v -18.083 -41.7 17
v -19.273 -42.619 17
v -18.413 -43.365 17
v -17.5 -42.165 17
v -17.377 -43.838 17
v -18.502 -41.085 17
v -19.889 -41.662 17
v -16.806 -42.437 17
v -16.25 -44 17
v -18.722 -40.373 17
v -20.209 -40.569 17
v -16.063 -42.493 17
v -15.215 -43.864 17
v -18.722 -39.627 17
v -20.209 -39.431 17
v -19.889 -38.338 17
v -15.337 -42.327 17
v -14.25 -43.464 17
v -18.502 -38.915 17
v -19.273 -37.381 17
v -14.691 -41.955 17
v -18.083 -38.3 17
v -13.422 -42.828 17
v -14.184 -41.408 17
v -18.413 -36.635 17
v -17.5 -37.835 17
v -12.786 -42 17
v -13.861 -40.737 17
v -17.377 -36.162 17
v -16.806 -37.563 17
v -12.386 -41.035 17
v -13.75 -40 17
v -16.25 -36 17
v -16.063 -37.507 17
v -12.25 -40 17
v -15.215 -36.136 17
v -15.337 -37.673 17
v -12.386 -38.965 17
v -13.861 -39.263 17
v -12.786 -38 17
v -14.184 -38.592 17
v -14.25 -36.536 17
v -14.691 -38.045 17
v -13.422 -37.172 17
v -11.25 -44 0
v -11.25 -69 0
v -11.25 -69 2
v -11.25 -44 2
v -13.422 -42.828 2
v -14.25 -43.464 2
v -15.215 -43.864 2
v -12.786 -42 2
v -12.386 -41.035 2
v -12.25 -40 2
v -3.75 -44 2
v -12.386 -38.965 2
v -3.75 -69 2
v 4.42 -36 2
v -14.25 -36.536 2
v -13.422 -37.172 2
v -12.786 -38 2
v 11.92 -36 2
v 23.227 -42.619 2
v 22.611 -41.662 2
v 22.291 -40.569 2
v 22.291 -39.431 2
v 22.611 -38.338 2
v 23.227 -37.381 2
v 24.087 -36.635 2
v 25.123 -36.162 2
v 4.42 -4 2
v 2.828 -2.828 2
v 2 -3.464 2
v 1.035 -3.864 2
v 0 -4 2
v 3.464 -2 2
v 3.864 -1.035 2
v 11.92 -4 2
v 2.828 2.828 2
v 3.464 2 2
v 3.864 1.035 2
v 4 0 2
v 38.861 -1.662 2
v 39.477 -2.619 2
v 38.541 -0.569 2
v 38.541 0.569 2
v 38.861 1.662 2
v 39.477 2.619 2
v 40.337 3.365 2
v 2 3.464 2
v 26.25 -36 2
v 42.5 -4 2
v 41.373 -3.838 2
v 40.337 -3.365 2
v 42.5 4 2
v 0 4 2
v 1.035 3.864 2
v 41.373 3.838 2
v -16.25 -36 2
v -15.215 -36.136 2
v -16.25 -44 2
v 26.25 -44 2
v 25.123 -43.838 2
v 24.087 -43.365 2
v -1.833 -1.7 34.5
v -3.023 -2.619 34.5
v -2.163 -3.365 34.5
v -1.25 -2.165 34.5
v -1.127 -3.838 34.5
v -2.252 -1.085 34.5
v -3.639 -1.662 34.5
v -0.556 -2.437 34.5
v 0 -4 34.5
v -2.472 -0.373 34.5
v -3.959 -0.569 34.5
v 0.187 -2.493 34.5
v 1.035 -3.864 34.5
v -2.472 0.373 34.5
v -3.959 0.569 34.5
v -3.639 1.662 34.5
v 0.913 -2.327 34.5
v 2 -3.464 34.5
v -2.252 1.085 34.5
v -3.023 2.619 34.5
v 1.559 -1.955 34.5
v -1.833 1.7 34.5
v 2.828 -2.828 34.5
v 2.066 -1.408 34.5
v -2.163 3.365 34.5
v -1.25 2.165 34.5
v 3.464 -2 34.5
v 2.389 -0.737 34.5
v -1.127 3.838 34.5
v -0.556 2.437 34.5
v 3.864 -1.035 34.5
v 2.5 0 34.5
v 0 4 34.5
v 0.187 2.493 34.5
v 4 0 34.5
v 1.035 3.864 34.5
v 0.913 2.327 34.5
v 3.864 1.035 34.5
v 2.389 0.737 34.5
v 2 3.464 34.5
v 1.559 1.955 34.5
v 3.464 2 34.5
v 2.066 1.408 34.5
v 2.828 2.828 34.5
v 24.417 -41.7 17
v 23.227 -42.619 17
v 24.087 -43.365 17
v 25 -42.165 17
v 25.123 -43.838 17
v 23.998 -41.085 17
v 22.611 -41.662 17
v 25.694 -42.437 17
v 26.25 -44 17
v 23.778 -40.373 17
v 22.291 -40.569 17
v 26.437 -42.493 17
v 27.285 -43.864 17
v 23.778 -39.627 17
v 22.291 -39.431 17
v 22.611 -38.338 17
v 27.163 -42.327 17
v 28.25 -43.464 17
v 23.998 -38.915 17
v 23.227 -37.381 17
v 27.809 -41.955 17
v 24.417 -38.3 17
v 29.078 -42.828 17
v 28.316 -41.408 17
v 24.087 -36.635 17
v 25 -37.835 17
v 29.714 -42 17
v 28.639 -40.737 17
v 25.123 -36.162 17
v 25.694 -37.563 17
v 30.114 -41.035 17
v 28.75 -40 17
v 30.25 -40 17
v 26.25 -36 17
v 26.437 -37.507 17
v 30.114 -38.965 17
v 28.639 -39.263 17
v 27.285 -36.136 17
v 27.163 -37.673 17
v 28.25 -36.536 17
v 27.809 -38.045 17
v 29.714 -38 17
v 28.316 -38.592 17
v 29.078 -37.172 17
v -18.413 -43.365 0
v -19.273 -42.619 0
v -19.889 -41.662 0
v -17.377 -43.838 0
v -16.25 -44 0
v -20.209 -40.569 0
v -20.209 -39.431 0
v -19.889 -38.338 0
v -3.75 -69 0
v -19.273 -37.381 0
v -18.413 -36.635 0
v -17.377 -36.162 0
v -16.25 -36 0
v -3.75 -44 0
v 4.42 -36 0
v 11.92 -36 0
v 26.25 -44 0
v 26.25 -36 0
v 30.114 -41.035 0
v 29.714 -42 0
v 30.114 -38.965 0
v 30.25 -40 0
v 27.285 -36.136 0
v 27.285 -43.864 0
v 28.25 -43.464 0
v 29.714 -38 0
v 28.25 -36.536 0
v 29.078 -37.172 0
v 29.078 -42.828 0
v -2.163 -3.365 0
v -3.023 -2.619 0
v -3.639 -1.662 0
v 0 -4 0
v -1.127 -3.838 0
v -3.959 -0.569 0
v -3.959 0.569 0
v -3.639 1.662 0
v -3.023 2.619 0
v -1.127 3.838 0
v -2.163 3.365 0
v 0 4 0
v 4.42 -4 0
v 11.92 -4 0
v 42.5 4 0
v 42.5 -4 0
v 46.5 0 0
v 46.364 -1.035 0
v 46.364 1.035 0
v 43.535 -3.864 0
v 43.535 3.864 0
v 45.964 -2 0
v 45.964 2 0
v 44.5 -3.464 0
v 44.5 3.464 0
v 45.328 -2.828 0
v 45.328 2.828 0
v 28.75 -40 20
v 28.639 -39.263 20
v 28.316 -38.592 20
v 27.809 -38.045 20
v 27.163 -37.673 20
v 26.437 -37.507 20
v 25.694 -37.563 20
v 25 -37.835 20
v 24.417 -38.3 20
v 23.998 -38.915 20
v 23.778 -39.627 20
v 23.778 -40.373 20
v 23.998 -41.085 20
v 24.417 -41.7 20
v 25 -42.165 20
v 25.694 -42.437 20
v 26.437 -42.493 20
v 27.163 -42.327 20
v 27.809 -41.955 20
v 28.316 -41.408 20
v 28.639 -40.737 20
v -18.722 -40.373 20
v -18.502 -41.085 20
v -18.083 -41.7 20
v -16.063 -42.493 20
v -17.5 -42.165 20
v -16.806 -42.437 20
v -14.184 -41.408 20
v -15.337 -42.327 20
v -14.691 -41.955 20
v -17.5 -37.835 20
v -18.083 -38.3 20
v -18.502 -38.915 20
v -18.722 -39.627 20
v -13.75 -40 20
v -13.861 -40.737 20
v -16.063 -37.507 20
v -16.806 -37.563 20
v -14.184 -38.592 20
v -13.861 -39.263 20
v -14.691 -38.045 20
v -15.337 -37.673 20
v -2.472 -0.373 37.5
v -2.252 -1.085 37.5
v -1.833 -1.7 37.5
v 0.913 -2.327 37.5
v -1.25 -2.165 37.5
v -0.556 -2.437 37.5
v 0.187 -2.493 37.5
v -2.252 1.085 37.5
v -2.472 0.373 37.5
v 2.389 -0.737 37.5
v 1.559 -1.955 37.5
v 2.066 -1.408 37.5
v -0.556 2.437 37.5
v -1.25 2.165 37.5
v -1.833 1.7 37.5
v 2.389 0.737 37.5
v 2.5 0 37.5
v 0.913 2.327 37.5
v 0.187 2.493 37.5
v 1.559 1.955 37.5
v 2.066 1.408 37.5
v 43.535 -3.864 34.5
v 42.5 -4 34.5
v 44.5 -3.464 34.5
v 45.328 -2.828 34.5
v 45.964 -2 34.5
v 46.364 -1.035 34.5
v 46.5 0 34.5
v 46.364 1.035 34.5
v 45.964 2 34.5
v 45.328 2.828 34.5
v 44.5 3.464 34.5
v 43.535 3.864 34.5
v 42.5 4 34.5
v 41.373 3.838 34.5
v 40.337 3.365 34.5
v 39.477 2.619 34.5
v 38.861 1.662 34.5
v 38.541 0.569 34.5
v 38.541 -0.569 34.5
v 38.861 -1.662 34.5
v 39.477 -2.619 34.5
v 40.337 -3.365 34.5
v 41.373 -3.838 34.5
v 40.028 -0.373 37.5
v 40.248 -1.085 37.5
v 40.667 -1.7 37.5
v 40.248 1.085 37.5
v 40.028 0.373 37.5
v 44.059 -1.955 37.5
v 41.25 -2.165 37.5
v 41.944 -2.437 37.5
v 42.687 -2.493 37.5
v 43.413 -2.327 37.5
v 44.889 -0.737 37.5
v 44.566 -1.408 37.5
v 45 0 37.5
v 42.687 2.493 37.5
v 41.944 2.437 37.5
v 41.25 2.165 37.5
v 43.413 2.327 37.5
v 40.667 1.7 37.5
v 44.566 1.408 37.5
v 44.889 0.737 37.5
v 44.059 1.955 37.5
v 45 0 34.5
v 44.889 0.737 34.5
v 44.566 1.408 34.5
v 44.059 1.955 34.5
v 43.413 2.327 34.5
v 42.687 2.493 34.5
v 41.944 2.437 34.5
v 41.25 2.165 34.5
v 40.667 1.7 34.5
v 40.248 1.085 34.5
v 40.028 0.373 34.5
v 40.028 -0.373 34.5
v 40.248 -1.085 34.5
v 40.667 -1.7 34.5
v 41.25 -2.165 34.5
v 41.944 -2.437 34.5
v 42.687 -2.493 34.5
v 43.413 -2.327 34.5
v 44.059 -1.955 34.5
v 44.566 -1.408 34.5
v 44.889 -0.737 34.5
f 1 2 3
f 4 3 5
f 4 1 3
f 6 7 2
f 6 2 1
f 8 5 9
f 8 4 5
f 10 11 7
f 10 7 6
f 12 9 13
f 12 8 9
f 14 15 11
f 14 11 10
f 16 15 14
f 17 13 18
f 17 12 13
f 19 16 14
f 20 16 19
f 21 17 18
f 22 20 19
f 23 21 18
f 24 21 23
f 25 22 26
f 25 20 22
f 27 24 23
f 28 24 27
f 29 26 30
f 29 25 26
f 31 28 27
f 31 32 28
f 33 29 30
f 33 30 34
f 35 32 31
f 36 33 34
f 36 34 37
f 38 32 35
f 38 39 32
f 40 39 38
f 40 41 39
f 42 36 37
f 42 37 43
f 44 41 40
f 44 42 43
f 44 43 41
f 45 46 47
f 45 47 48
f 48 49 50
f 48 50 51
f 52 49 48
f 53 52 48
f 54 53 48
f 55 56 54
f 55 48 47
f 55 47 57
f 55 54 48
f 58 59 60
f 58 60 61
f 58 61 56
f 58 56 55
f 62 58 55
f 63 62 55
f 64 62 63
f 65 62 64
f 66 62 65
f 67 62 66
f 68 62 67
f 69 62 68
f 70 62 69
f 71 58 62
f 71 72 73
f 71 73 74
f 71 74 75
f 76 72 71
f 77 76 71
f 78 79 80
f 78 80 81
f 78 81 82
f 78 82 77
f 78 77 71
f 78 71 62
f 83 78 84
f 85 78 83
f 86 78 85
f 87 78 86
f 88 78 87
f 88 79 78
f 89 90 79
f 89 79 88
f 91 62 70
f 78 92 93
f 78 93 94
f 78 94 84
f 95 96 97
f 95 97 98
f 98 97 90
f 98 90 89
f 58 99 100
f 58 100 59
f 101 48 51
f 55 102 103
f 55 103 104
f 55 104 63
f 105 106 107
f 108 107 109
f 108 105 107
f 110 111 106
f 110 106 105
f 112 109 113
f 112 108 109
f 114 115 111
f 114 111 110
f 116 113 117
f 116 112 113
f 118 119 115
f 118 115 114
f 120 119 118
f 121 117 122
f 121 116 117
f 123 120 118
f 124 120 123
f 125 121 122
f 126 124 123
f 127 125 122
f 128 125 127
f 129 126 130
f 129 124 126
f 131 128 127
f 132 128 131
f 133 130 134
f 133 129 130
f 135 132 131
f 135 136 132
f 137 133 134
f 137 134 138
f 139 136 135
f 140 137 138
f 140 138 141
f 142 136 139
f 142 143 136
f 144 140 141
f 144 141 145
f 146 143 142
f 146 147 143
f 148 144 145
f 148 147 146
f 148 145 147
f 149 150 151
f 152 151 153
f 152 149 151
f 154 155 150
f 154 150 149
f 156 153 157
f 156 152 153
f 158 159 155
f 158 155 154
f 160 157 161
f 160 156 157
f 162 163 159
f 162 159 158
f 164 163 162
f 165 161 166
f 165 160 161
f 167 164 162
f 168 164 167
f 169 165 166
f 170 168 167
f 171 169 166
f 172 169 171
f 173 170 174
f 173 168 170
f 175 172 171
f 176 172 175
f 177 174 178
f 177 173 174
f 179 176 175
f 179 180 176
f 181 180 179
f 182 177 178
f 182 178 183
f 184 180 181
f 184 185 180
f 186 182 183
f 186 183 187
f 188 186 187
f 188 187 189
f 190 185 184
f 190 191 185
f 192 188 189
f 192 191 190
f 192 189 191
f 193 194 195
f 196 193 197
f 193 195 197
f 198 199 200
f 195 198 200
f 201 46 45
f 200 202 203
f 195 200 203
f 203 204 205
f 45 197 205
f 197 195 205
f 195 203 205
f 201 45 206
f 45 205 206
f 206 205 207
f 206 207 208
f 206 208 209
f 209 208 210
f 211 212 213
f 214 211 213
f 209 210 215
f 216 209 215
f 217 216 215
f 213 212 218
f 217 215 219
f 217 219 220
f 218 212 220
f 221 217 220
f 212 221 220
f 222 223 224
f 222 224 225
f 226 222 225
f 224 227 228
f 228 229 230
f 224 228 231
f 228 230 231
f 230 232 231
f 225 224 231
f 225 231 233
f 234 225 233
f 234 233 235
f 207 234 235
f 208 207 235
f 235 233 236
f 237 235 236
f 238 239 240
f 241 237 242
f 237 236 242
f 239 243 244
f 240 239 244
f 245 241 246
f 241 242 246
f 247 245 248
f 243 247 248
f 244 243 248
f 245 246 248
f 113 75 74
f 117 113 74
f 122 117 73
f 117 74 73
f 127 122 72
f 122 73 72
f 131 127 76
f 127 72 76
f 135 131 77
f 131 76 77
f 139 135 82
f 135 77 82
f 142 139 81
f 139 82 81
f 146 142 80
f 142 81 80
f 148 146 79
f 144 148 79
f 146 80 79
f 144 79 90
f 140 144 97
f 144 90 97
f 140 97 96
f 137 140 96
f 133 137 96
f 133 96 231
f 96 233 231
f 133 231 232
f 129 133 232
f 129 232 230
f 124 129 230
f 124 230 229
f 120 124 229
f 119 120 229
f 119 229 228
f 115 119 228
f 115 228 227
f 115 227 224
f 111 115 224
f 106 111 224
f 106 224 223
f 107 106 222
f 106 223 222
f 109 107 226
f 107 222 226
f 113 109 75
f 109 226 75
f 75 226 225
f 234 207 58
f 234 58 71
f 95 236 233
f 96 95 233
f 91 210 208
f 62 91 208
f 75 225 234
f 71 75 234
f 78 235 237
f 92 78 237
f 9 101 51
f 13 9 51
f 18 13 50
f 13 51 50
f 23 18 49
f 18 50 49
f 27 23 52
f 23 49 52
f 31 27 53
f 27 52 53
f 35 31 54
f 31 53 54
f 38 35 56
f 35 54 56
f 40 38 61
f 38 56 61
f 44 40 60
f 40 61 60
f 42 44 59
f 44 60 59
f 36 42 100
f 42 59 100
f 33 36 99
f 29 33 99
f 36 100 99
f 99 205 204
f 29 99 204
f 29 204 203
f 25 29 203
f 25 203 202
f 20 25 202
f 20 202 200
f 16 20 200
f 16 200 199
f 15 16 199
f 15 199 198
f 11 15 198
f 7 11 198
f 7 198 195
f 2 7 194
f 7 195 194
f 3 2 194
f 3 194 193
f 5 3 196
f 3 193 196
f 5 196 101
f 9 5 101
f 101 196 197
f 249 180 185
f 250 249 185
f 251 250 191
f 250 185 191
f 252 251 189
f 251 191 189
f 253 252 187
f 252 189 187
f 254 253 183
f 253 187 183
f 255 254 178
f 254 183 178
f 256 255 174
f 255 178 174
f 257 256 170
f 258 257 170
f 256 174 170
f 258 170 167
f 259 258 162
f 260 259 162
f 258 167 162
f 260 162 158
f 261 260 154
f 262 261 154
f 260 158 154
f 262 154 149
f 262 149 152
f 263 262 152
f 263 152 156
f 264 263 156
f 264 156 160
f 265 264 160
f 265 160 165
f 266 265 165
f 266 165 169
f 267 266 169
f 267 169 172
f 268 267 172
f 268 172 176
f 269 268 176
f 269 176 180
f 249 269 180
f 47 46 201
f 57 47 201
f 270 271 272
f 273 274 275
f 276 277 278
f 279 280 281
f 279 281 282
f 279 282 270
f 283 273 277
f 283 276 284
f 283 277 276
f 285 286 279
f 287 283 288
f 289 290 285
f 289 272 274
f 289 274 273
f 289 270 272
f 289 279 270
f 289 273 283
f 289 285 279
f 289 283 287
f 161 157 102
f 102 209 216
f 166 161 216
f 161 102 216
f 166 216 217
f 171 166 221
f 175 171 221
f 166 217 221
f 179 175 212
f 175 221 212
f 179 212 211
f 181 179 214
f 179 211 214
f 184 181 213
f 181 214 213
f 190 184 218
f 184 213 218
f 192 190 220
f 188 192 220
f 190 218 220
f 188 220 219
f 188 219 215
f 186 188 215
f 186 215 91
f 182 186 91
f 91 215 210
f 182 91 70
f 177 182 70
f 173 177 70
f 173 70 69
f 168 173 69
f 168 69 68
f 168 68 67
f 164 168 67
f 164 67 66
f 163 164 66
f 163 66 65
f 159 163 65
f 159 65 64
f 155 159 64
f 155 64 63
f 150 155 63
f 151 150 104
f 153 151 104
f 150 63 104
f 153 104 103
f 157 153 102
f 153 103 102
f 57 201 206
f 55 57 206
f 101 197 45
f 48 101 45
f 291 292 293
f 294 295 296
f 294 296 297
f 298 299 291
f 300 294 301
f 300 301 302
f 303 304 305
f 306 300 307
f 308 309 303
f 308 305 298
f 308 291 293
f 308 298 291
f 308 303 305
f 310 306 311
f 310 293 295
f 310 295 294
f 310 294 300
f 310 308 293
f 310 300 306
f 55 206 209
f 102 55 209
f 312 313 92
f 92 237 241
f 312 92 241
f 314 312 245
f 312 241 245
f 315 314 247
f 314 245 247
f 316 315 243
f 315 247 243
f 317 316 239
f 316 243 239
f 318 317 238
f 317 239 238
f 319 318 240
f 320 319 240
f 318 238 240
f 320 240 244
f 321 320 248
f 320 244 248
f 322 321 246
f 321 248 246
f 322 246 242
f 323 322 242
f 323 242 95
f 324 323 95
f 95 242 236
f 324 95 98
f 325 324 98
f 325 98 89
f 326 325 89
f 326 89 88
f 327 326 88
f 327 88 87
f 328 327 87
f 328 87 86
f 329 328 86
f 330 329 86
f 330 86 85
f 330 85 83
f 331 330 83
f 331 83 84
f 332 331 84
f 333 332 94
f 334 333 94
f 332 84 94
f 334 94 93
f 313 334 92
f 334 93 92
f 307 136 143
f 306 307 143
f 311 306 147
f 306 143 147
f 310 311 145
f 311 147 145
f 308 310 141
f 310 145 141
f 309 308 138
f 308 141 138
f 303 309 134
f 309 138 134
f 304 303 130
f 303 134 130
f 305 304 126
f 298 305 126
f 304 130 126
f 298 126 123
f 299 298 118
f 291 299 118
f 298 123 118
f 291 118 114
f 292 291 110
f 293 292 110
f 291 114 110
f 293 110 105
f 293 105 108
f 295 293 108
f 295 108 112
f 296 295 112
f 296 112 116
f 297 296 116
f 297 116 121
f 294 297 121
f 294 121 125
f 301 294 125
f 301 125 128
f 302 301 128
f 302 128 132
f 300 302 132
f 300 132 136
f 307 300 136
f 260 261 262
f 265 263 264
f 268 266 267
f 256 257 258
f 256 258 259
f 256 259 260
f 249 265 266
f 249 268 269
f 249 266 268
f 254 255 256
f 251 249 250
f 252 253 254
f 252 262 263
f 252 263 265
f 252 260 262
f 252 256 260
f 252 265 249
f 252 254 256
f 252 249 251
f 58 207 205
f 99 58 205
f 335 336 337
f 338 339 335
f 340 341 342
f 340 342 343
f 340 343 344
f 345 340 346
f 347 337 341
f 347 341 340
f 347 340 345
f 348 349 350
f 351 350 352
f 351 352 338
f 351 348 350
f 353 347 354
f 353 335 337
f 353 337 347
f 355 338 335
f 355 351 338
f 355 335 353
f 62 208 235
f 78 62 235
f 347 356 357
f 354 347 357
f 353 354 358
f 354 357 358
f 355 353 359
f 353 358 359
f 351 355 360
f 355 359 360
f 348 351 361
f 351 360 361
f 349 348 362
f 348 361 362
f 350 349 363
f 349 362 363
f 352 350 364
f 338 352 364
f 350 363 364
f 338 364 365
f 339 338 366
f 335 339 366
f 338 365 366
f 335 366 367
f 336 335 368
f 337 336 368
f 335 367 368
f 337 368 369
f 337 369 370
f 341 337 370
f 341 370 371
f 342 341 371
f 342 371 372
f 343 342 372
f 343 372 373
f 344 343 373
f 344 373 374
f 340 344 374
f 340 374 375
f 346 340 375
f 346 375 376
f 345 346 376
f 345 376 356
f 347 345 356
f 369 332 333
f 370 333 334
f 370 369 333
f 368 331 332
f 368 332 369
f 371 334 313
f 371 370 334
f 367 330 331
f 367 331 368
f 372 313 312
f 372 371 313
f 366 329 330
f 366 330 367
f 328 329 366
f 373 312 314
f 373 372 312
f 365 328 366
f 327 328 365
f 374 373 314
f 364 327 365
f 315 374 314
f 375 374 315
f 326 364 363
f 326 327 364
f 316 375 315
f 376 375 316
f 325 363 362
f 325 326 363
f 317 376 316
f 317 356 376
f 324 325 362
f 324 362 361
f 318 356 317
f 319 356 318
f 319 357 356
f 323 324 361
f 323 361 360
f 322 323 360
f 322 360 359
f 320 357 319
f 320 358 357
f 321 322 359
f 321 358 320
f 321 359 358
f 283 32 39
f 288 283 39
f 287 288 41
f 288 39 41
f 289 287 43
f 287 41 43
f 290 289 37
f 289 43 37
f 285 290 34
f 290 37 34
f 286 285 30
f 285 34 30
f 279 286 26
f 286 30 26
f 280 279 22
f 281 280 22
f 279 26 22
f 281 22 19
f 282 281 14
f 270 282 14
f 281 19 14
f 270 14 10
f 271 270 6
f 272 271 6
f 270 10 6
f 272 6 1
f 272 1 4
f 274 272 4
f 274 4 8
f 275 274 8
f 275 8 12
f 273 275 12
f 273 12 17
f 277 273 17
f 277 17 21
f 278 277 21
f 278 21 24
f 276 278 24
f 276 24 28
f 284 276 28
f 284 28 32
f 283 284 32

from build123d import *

# Parameters (mm, degrees)
F5_R      = 2.5
F6_DEPTH  = 2
F7_DEPTH  = 34.5
F8_DEPTH  = 37.5
F9_DEPTH  = 17
F10_DEPTH = 20
F12_W     = 7.5
F12_H     = 32
F12_H_2   = 25
F13_DEPTH = 2


with BuildPart() as f6:
    # F5 (on Top) → F6 (new body)
    with BuildSketch(Plane.XY):
        with BuildLine():
            ThreePointArc((0, 4), (2.8284271247, 2.8284271247), (4, 0))
            ThreePointArc((4, 0), (2.8284271247, -2.8284271247), (0, -4))
            Line((0, -4), (42.5, -4))
            ThreePointArc((42.5, -4), (38.5, 0), (42.5, 4))
            Line((42.5, 4), (0, 4))
        make_face()
        with BuildLine():
            ThreePointArc((0, -4), (2.8284271247, -2.8284271247), (4, 0))
            ThreePointArc((4, 0), (2.8284271247, 2.8284271247), (0, 4))
            ThreePointArc((0, 4), (-4, 0), (0, -4))
        make_face()
        Circle(F5_R, mode=Mode.SUBTRACT)
        with BuildLine():
            ThreePointArc((46.5, 0), (45.3284271247, 2.8284271247), (42.5, 4))
            ThreePointArc((42.5, 4), (38.5, 0), (42.5, -4))
            ThreePointArc((42.5, -4), (45.3284271247, -2.8284271247), (46.5, 0))
        make_face()
        with Locations((42.5, 0)):
            Circle(F5_R, mode=Mode.SUBTRACT)
        Circle(F5_R)
        with Locations((42.5, 0)):
            Circle(F5_R)
    extrude(amount=F6_DEPTH)

    # F5 (on Top) → F7 (join)
    with BuildSketch(Plane.XY):
        with BuildLine():
            ThreePointArc((0, -4), (2.8284271247, -2.8284271247), (4, 0))
            ThreePointArc((4, 0), (2.8284271247, 2.8284271247), (0, 4))
            ThreePointArc((0, 4), (-4, 0), (0, -4))
        make_face()
        Circle(F5_R, mode=Mode.SUBTRACT)
        with BuildLine():
            ThreePointArc((46.5, 0), (45.3284271247, 2.8284271247), (42.5, 4))
            ThreePointArc((42.5, 4), (38.5, 0), (42.5, -4))
            ThreePointArc((42.5, -4), (45.3284271247, -2.8284271247), (46.5, 0))
        make_face()
        with Locations((42.5, 0)):
            Circle(F5_R, mode=Mode.SUBTRACT)
        Circle(F5_R)
        with Locations((42.5, 0)):
            Circle(F5_R)
    extrude(amount=F7_DEPTH)

    # F5 (on Top) → F8 (join)
    with BuildSketch(Plane.XY):
        Circle(F5_R)
        with Locations((42.5, 0)):
            Circle(F5_R)
    extrude(amount=F8_DEPTH)



with BuildPart() as f6b:
    # F5 (on Top) → F6, piece 2 (new body)
    with BuildSketch(Plane.XY):
        with BuildLine():
            ThreePointArc((0, -36), (2.8284271247, -37.1715728753), (4, -40))
            ThreePointArc((4, -40), (2.8284271247, -42.8284271247), (0, -44))
            Line((0, -44), (42.5, -44))
            ThreePointArc((42.5, -44), (38.5, -40), (42.5, -36))
            Line((42.5, -36), (0, -36))
        make_face()
        with BuildLine():
            ThreePointArc((46.5, -40), (45.3284271247, -37.1715728753), (42.5, -36))
            ThreePointArc((42.5, -36), (38.5, -40), (42.5, -44))
            ThreePointArc((42.5, -44), (45.3284271247, -42.8284271247), (46.5, -40))
        make_face()
        with Locations((42.5, -40)):
            Circle(F5_R, mode=Mode.SUBTRACT)
        with BuildLine():
            ThreePointArc((0, -44), (2.8284271247, -42.8284271247), (4, -40))
            ThreePointArc((4, -40), (2.8284271247, -37.1715728753), (0, -36))
            ThreePointArc((0, -36), (-4, -40), (0, -44))
        make_face()
        with Locations((0, -40)):
            Circle(F5_R, mode=Mode.SUBTRACT)
        with Locations((0, -40)):
            Circle(F5_R)
        with Locations((42.5, -40)):
            Circle(F5_R)
    extrude(amount=F6_DEPTH)

    # F5 (on Top) → F9 (join)
    with BuildSketch(Plane.XY):
        with BuildLine():
            ThreePointArc((0, -44), (2.8284271247, -42.8284271247), (4, -40))
            ThreePointArc((4, -40), (2.8284271247, -37.1715728753), (0, -36))
            ThreePointArc((0, -36), (-4, -40), (0, -44))
        make_face()
        with Locations((0, -40)):
            Circle(F5_R, mode=Mode.SUBTRACT)
        with BuildLine():
            ThreePointArc((46.5, -40), (45.3284271247, -37.1715728753), (42.5, -36))
            ThreePointArc((42.5, -36), (38.5, -40), (42.5, -44))
            ThreePointArc((42.5, -44), (45.3284271247, -42.8284271247), (46.5, -40))
        make_face()
        with Locations((42.5, -40)):
            Circle(F5_R, mode=Mode.SUBTRACT)
        with Locations((0, -40)):
            Circle(F5_R)
        with Locations((42.5, -40)):
            Circle(F5_R)
    extrude(amount=F9_DEPTH)

    # F5 (on Top) → F10 (join)
    with BuildSketch(Plane.XY):
        with Locations((0, -40)):
            Circle(F5_R)
        with Locations((42.5, -40)):
            Circle(F5_R)
    extrude(amount=F10_DEPTH)


with BuildPart() as f6b_1:
    # F11: moved
    add(f6b.part.moved(Location((-16.25, 0, 0))))


with BuildPart() as f6_1:
    add(f6.part)

    add(f6b_1.part)  # F13 merges F6b
    # F12 (on Top) → F13 (join)
    with BuildSketch(Plane.XY):
        with Locations((8.1697826646, -20)):
            Rectangle(F12_W, F12_H)
        with Locations((-7.5, -56.5)):
            Rectangle(F12_W, F12_H_2)
    extrude(amount=F13_DEPTH)


solid = f6_1.part
